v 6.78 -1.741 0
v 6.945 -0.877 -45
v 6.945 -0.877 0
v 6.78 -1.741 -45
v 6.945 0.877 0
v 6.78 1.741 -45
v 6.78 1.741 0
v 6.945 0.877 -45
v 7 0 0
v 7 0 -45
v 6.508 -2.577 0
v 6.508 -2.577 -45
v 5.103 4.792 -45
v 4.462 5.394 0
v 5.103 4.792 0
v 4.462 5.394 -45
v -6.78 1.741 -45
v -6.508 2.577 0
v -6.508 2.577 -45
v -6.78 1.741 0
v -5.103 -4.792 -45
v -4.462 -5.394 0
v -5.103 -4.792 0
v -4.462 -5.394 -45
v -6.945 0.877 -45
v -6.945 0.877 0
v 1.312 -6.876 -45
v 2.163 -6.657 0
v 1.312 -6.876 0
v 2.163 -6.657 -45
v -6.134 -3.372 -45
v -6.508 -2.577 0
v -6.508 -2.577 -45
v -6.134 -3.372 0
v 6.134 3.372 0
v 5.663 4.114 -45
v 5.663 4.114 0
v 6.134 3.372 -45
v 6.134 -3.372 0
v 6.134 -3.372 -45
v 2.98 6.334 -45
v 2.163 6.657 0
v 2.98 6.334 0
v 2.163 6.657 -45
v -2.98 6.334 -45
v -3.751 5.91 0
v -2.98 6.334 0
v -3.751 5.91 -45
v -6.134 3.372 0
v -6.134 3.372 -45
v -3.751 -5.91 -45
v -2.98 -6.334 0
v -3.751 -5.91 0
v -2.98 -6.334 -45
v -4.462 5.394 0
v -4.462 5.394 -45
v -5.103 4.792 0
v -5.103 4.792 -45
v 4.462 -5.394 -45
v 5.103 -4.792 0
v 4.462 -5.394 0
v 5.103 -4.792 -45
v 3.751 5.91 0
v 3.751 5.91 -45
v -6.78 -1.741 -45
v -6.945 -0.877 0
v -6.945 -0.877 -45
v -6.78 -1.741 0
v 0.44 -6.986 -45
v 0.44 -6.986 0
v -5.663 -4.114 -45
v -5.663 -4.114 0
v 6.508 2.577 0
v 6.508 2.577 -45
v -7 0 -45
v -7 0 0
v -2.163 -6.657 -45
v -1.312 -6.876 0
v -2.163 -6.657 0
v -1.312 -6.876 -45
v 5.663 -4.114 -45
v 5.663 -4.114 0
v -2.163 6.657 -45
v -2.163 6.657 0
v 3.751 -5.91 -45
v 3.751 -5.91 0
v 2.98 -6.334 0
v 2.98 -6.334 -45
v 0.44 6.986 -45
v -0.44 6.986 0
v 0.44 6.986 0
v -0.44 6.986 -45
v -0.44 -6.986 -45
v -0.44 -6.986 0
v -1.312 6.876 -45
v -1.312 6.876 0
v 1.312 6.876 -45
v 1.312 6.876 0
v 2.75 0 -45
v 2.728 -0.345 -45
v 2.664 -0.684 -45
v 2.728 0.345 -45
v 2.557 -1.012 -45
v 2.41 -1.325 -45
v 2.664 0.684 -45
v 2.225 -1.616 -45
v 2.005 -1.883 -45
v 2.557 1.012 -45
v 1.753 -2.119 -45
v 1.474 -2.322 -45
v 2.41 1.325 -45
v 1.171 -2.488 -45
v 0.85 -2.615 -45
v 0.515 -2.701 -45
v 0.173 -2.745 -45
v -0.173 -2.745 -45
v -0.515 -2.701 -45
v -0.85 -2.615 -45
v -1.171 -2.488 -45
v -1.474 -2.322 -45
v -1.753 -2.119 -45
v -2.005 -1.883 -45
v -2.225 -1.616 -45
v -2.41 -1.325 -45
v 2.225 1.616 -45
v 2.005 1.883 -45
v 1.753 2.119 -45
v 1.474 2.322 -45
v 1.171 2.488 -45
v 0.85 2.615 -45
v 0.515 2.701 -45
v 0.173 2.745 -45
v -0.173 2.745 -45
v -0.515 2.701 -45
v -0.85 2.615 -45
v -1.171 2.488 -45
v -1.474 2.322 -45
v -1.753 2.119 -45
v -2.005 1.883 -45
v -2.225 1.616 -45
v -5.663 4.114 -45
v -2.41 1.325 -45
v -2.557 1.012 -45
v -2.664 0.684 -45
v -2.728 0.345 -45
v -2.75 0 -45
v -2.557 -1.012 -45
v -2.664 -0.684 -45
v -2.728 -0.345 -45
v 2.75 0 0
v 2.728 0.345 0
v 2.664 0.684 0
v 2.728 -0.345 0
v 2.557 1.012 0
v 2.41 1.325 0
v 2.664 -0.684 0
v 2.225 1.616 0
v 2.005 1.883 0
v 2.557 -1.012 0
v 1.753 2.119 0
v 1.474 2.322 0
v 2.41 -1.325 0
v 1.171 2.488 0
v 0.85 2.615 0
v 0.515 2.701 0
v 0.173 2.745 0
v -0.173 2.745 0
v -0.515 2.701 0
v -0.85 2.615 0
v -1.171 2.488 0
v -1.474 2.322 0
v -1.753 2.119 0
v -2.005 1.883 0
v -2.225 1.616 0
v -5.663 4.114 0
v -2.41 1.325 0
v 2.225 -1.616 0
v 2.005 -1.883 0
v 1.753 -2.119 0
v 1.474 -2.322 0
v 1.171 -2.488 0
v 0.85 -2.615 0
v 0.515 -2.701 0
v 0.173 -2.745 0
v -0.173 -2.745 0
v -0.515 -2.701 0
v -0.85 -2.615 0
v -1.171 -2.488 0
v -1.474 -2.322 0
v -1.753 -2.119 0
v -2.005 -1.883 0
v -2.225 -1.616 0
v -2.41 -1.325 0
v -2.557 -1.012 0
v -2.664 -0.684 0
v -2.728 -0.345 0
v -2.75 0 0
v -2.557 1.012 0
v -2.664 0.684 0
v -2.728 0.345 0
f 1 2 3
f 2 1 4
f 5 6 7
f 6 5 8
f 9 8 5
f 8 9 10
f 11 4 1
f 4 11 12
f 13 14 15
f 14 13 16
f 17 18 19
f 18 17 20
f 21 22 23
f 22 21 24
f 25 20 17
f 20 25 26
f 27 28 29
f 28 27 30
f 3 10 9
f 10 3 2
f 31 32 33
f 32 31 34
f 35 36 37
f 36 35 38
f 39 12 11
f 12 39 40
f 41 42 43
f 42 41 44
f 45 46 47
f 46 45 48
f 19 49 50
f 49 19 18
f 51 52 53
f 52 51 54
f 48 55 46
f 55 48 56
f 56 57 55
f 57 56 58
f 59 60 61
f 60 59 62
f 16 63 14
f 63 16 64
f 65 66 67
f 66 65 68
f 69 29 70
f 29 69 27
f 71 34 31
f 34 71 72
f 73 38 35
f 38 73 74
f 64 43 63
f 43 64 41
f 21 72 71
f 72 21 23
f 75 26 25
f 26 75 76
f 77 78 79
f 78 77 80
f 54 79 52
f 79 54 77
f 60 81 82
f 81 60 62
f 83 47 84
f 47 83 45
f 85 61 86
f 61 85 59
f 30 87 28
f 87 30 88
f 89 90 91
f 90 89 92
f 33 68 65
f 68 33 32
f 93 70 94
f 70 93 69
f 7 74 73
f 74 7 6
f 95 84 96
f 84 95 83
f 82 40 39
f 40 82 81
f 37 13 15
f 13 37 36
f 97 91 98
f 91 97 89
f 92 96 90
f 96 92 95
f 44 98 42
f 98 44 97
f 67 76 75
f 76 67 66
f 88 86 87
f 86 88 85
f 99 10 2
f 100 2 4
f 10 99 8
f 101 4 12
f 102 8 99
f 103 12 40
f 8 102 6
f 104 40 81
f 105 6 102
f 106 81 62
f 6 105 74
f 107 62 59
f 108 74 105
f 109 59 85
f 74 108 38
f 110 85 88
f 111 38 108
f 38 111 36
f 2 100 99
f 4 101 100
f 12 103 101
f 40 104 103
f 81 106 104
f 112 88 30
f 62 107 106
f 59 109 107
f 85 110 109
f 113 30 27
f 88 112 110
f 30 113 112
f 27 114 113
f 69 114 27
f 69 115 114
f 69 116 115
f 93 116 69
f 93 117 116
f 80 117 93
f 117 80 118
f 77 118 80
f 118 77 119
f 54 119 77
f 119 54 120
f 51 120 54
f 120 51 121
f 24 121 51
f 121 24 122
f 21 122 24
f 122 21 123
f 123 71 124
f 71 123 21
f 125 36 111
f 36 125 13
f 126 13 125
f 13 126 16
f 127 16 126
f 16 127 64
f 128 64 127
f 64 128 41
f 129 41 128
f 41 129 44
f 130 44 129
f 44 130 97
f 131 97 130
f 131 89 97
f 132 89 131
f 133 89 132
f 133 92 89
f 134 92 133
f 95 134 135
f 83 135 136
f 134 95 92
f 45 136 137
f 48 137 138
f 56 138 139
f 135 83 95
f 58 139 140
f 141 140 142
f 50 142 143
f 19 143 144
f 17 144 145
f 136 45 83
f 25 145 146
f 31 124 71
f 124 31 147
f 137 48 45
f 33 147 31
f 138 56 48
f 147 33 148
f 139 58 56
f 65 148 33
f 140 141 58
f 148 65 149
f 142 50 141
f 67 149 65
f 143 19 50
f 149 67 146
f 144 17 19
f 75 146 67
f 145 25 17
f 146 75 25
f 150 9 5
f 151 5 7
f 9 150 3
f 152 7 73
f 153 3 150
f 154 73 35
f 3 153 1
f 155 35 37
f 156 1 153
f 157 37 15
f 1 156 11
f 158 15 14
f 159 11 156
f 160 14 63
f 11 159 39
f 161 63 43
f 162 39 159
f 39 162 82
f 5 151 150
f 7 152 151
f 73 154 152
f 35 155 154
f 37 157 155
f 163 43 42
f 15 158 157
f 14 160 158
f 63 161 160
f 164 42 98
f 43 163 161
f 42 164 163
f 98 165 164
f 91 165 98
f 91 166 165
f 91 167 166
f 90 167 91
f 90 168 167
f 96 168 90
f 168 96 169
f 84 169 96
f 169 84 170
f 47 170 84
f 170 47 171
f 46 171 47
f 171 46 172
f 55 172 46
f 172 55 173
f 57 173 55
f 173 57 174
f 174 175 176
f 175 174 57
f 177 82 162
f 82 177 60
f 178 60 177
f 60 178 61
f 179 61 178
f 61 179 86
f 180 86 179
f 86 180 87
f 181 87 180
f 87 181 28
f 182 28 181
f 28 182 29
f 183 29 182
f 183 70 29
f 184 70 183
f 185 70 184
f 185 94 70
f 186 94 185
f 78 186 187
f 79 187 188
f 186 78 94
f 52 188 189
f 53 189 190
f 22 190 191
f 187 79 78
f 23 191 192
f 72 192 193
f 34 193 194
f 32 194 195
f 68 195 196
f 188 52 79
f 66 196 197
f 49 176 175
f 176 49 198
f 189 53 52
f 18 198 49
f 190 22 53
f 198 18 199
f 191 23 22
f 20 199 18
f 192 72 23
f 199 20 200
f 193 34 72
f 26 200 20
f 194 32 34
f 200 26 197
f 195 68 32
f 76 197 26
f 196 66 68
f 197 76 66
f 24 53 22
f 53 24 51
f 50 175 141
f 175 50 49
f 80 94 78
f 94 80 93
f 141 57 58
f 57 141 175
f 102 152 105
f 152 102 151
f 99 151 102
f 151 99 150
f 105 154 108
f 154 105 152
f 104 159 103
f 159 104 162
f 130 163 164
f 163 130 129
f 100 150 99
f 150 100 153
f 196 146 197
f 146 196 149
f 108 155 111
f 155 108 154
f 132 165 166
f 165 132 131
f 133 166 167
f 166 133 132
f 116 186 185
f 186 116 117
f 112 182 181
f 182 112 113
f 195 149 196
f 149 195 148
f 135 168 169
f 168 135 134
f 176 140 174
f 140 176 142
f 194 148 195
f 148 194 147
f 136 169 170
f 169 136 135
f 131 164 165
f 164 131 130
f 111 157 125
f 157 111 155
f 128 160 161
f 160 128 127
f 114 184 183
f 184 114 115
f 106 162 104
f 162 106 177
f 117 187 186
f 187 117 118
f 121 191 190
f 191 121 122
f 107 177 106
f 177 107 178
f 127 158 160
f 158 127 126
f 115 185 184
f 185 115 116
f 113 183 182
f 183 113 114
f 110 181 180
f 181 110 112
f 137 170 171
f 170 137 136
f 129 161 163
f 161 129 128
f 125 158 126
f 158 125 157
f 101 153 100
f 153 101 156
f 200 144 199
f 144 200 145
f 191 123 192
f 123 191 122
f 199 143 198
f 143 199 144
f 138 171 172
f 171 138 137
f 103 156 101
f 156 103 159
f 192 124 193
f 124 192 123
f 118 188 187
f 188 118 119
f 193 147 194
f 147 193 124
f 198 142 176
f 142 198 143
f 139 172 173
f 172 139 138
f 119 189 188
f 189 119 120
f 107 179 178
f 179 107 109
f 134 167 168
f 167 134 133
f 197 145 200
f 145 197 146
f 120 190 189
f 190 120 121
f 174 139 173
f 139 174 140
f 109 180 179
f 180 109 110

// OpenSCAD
$fn = 50;


difference() {
	union() {
		translate(v = [0, 0, -45.0000000000]) {
			cylinder(h = 45, r = 7.0000000000);
		}
		cylinder(h = 0, r = 13.0000000000);
	}
	union() {
		#translate(v = [0, 0, -45]) {
			cylinder(h = 45, r = 2.7500000000);
		}
	}
}
